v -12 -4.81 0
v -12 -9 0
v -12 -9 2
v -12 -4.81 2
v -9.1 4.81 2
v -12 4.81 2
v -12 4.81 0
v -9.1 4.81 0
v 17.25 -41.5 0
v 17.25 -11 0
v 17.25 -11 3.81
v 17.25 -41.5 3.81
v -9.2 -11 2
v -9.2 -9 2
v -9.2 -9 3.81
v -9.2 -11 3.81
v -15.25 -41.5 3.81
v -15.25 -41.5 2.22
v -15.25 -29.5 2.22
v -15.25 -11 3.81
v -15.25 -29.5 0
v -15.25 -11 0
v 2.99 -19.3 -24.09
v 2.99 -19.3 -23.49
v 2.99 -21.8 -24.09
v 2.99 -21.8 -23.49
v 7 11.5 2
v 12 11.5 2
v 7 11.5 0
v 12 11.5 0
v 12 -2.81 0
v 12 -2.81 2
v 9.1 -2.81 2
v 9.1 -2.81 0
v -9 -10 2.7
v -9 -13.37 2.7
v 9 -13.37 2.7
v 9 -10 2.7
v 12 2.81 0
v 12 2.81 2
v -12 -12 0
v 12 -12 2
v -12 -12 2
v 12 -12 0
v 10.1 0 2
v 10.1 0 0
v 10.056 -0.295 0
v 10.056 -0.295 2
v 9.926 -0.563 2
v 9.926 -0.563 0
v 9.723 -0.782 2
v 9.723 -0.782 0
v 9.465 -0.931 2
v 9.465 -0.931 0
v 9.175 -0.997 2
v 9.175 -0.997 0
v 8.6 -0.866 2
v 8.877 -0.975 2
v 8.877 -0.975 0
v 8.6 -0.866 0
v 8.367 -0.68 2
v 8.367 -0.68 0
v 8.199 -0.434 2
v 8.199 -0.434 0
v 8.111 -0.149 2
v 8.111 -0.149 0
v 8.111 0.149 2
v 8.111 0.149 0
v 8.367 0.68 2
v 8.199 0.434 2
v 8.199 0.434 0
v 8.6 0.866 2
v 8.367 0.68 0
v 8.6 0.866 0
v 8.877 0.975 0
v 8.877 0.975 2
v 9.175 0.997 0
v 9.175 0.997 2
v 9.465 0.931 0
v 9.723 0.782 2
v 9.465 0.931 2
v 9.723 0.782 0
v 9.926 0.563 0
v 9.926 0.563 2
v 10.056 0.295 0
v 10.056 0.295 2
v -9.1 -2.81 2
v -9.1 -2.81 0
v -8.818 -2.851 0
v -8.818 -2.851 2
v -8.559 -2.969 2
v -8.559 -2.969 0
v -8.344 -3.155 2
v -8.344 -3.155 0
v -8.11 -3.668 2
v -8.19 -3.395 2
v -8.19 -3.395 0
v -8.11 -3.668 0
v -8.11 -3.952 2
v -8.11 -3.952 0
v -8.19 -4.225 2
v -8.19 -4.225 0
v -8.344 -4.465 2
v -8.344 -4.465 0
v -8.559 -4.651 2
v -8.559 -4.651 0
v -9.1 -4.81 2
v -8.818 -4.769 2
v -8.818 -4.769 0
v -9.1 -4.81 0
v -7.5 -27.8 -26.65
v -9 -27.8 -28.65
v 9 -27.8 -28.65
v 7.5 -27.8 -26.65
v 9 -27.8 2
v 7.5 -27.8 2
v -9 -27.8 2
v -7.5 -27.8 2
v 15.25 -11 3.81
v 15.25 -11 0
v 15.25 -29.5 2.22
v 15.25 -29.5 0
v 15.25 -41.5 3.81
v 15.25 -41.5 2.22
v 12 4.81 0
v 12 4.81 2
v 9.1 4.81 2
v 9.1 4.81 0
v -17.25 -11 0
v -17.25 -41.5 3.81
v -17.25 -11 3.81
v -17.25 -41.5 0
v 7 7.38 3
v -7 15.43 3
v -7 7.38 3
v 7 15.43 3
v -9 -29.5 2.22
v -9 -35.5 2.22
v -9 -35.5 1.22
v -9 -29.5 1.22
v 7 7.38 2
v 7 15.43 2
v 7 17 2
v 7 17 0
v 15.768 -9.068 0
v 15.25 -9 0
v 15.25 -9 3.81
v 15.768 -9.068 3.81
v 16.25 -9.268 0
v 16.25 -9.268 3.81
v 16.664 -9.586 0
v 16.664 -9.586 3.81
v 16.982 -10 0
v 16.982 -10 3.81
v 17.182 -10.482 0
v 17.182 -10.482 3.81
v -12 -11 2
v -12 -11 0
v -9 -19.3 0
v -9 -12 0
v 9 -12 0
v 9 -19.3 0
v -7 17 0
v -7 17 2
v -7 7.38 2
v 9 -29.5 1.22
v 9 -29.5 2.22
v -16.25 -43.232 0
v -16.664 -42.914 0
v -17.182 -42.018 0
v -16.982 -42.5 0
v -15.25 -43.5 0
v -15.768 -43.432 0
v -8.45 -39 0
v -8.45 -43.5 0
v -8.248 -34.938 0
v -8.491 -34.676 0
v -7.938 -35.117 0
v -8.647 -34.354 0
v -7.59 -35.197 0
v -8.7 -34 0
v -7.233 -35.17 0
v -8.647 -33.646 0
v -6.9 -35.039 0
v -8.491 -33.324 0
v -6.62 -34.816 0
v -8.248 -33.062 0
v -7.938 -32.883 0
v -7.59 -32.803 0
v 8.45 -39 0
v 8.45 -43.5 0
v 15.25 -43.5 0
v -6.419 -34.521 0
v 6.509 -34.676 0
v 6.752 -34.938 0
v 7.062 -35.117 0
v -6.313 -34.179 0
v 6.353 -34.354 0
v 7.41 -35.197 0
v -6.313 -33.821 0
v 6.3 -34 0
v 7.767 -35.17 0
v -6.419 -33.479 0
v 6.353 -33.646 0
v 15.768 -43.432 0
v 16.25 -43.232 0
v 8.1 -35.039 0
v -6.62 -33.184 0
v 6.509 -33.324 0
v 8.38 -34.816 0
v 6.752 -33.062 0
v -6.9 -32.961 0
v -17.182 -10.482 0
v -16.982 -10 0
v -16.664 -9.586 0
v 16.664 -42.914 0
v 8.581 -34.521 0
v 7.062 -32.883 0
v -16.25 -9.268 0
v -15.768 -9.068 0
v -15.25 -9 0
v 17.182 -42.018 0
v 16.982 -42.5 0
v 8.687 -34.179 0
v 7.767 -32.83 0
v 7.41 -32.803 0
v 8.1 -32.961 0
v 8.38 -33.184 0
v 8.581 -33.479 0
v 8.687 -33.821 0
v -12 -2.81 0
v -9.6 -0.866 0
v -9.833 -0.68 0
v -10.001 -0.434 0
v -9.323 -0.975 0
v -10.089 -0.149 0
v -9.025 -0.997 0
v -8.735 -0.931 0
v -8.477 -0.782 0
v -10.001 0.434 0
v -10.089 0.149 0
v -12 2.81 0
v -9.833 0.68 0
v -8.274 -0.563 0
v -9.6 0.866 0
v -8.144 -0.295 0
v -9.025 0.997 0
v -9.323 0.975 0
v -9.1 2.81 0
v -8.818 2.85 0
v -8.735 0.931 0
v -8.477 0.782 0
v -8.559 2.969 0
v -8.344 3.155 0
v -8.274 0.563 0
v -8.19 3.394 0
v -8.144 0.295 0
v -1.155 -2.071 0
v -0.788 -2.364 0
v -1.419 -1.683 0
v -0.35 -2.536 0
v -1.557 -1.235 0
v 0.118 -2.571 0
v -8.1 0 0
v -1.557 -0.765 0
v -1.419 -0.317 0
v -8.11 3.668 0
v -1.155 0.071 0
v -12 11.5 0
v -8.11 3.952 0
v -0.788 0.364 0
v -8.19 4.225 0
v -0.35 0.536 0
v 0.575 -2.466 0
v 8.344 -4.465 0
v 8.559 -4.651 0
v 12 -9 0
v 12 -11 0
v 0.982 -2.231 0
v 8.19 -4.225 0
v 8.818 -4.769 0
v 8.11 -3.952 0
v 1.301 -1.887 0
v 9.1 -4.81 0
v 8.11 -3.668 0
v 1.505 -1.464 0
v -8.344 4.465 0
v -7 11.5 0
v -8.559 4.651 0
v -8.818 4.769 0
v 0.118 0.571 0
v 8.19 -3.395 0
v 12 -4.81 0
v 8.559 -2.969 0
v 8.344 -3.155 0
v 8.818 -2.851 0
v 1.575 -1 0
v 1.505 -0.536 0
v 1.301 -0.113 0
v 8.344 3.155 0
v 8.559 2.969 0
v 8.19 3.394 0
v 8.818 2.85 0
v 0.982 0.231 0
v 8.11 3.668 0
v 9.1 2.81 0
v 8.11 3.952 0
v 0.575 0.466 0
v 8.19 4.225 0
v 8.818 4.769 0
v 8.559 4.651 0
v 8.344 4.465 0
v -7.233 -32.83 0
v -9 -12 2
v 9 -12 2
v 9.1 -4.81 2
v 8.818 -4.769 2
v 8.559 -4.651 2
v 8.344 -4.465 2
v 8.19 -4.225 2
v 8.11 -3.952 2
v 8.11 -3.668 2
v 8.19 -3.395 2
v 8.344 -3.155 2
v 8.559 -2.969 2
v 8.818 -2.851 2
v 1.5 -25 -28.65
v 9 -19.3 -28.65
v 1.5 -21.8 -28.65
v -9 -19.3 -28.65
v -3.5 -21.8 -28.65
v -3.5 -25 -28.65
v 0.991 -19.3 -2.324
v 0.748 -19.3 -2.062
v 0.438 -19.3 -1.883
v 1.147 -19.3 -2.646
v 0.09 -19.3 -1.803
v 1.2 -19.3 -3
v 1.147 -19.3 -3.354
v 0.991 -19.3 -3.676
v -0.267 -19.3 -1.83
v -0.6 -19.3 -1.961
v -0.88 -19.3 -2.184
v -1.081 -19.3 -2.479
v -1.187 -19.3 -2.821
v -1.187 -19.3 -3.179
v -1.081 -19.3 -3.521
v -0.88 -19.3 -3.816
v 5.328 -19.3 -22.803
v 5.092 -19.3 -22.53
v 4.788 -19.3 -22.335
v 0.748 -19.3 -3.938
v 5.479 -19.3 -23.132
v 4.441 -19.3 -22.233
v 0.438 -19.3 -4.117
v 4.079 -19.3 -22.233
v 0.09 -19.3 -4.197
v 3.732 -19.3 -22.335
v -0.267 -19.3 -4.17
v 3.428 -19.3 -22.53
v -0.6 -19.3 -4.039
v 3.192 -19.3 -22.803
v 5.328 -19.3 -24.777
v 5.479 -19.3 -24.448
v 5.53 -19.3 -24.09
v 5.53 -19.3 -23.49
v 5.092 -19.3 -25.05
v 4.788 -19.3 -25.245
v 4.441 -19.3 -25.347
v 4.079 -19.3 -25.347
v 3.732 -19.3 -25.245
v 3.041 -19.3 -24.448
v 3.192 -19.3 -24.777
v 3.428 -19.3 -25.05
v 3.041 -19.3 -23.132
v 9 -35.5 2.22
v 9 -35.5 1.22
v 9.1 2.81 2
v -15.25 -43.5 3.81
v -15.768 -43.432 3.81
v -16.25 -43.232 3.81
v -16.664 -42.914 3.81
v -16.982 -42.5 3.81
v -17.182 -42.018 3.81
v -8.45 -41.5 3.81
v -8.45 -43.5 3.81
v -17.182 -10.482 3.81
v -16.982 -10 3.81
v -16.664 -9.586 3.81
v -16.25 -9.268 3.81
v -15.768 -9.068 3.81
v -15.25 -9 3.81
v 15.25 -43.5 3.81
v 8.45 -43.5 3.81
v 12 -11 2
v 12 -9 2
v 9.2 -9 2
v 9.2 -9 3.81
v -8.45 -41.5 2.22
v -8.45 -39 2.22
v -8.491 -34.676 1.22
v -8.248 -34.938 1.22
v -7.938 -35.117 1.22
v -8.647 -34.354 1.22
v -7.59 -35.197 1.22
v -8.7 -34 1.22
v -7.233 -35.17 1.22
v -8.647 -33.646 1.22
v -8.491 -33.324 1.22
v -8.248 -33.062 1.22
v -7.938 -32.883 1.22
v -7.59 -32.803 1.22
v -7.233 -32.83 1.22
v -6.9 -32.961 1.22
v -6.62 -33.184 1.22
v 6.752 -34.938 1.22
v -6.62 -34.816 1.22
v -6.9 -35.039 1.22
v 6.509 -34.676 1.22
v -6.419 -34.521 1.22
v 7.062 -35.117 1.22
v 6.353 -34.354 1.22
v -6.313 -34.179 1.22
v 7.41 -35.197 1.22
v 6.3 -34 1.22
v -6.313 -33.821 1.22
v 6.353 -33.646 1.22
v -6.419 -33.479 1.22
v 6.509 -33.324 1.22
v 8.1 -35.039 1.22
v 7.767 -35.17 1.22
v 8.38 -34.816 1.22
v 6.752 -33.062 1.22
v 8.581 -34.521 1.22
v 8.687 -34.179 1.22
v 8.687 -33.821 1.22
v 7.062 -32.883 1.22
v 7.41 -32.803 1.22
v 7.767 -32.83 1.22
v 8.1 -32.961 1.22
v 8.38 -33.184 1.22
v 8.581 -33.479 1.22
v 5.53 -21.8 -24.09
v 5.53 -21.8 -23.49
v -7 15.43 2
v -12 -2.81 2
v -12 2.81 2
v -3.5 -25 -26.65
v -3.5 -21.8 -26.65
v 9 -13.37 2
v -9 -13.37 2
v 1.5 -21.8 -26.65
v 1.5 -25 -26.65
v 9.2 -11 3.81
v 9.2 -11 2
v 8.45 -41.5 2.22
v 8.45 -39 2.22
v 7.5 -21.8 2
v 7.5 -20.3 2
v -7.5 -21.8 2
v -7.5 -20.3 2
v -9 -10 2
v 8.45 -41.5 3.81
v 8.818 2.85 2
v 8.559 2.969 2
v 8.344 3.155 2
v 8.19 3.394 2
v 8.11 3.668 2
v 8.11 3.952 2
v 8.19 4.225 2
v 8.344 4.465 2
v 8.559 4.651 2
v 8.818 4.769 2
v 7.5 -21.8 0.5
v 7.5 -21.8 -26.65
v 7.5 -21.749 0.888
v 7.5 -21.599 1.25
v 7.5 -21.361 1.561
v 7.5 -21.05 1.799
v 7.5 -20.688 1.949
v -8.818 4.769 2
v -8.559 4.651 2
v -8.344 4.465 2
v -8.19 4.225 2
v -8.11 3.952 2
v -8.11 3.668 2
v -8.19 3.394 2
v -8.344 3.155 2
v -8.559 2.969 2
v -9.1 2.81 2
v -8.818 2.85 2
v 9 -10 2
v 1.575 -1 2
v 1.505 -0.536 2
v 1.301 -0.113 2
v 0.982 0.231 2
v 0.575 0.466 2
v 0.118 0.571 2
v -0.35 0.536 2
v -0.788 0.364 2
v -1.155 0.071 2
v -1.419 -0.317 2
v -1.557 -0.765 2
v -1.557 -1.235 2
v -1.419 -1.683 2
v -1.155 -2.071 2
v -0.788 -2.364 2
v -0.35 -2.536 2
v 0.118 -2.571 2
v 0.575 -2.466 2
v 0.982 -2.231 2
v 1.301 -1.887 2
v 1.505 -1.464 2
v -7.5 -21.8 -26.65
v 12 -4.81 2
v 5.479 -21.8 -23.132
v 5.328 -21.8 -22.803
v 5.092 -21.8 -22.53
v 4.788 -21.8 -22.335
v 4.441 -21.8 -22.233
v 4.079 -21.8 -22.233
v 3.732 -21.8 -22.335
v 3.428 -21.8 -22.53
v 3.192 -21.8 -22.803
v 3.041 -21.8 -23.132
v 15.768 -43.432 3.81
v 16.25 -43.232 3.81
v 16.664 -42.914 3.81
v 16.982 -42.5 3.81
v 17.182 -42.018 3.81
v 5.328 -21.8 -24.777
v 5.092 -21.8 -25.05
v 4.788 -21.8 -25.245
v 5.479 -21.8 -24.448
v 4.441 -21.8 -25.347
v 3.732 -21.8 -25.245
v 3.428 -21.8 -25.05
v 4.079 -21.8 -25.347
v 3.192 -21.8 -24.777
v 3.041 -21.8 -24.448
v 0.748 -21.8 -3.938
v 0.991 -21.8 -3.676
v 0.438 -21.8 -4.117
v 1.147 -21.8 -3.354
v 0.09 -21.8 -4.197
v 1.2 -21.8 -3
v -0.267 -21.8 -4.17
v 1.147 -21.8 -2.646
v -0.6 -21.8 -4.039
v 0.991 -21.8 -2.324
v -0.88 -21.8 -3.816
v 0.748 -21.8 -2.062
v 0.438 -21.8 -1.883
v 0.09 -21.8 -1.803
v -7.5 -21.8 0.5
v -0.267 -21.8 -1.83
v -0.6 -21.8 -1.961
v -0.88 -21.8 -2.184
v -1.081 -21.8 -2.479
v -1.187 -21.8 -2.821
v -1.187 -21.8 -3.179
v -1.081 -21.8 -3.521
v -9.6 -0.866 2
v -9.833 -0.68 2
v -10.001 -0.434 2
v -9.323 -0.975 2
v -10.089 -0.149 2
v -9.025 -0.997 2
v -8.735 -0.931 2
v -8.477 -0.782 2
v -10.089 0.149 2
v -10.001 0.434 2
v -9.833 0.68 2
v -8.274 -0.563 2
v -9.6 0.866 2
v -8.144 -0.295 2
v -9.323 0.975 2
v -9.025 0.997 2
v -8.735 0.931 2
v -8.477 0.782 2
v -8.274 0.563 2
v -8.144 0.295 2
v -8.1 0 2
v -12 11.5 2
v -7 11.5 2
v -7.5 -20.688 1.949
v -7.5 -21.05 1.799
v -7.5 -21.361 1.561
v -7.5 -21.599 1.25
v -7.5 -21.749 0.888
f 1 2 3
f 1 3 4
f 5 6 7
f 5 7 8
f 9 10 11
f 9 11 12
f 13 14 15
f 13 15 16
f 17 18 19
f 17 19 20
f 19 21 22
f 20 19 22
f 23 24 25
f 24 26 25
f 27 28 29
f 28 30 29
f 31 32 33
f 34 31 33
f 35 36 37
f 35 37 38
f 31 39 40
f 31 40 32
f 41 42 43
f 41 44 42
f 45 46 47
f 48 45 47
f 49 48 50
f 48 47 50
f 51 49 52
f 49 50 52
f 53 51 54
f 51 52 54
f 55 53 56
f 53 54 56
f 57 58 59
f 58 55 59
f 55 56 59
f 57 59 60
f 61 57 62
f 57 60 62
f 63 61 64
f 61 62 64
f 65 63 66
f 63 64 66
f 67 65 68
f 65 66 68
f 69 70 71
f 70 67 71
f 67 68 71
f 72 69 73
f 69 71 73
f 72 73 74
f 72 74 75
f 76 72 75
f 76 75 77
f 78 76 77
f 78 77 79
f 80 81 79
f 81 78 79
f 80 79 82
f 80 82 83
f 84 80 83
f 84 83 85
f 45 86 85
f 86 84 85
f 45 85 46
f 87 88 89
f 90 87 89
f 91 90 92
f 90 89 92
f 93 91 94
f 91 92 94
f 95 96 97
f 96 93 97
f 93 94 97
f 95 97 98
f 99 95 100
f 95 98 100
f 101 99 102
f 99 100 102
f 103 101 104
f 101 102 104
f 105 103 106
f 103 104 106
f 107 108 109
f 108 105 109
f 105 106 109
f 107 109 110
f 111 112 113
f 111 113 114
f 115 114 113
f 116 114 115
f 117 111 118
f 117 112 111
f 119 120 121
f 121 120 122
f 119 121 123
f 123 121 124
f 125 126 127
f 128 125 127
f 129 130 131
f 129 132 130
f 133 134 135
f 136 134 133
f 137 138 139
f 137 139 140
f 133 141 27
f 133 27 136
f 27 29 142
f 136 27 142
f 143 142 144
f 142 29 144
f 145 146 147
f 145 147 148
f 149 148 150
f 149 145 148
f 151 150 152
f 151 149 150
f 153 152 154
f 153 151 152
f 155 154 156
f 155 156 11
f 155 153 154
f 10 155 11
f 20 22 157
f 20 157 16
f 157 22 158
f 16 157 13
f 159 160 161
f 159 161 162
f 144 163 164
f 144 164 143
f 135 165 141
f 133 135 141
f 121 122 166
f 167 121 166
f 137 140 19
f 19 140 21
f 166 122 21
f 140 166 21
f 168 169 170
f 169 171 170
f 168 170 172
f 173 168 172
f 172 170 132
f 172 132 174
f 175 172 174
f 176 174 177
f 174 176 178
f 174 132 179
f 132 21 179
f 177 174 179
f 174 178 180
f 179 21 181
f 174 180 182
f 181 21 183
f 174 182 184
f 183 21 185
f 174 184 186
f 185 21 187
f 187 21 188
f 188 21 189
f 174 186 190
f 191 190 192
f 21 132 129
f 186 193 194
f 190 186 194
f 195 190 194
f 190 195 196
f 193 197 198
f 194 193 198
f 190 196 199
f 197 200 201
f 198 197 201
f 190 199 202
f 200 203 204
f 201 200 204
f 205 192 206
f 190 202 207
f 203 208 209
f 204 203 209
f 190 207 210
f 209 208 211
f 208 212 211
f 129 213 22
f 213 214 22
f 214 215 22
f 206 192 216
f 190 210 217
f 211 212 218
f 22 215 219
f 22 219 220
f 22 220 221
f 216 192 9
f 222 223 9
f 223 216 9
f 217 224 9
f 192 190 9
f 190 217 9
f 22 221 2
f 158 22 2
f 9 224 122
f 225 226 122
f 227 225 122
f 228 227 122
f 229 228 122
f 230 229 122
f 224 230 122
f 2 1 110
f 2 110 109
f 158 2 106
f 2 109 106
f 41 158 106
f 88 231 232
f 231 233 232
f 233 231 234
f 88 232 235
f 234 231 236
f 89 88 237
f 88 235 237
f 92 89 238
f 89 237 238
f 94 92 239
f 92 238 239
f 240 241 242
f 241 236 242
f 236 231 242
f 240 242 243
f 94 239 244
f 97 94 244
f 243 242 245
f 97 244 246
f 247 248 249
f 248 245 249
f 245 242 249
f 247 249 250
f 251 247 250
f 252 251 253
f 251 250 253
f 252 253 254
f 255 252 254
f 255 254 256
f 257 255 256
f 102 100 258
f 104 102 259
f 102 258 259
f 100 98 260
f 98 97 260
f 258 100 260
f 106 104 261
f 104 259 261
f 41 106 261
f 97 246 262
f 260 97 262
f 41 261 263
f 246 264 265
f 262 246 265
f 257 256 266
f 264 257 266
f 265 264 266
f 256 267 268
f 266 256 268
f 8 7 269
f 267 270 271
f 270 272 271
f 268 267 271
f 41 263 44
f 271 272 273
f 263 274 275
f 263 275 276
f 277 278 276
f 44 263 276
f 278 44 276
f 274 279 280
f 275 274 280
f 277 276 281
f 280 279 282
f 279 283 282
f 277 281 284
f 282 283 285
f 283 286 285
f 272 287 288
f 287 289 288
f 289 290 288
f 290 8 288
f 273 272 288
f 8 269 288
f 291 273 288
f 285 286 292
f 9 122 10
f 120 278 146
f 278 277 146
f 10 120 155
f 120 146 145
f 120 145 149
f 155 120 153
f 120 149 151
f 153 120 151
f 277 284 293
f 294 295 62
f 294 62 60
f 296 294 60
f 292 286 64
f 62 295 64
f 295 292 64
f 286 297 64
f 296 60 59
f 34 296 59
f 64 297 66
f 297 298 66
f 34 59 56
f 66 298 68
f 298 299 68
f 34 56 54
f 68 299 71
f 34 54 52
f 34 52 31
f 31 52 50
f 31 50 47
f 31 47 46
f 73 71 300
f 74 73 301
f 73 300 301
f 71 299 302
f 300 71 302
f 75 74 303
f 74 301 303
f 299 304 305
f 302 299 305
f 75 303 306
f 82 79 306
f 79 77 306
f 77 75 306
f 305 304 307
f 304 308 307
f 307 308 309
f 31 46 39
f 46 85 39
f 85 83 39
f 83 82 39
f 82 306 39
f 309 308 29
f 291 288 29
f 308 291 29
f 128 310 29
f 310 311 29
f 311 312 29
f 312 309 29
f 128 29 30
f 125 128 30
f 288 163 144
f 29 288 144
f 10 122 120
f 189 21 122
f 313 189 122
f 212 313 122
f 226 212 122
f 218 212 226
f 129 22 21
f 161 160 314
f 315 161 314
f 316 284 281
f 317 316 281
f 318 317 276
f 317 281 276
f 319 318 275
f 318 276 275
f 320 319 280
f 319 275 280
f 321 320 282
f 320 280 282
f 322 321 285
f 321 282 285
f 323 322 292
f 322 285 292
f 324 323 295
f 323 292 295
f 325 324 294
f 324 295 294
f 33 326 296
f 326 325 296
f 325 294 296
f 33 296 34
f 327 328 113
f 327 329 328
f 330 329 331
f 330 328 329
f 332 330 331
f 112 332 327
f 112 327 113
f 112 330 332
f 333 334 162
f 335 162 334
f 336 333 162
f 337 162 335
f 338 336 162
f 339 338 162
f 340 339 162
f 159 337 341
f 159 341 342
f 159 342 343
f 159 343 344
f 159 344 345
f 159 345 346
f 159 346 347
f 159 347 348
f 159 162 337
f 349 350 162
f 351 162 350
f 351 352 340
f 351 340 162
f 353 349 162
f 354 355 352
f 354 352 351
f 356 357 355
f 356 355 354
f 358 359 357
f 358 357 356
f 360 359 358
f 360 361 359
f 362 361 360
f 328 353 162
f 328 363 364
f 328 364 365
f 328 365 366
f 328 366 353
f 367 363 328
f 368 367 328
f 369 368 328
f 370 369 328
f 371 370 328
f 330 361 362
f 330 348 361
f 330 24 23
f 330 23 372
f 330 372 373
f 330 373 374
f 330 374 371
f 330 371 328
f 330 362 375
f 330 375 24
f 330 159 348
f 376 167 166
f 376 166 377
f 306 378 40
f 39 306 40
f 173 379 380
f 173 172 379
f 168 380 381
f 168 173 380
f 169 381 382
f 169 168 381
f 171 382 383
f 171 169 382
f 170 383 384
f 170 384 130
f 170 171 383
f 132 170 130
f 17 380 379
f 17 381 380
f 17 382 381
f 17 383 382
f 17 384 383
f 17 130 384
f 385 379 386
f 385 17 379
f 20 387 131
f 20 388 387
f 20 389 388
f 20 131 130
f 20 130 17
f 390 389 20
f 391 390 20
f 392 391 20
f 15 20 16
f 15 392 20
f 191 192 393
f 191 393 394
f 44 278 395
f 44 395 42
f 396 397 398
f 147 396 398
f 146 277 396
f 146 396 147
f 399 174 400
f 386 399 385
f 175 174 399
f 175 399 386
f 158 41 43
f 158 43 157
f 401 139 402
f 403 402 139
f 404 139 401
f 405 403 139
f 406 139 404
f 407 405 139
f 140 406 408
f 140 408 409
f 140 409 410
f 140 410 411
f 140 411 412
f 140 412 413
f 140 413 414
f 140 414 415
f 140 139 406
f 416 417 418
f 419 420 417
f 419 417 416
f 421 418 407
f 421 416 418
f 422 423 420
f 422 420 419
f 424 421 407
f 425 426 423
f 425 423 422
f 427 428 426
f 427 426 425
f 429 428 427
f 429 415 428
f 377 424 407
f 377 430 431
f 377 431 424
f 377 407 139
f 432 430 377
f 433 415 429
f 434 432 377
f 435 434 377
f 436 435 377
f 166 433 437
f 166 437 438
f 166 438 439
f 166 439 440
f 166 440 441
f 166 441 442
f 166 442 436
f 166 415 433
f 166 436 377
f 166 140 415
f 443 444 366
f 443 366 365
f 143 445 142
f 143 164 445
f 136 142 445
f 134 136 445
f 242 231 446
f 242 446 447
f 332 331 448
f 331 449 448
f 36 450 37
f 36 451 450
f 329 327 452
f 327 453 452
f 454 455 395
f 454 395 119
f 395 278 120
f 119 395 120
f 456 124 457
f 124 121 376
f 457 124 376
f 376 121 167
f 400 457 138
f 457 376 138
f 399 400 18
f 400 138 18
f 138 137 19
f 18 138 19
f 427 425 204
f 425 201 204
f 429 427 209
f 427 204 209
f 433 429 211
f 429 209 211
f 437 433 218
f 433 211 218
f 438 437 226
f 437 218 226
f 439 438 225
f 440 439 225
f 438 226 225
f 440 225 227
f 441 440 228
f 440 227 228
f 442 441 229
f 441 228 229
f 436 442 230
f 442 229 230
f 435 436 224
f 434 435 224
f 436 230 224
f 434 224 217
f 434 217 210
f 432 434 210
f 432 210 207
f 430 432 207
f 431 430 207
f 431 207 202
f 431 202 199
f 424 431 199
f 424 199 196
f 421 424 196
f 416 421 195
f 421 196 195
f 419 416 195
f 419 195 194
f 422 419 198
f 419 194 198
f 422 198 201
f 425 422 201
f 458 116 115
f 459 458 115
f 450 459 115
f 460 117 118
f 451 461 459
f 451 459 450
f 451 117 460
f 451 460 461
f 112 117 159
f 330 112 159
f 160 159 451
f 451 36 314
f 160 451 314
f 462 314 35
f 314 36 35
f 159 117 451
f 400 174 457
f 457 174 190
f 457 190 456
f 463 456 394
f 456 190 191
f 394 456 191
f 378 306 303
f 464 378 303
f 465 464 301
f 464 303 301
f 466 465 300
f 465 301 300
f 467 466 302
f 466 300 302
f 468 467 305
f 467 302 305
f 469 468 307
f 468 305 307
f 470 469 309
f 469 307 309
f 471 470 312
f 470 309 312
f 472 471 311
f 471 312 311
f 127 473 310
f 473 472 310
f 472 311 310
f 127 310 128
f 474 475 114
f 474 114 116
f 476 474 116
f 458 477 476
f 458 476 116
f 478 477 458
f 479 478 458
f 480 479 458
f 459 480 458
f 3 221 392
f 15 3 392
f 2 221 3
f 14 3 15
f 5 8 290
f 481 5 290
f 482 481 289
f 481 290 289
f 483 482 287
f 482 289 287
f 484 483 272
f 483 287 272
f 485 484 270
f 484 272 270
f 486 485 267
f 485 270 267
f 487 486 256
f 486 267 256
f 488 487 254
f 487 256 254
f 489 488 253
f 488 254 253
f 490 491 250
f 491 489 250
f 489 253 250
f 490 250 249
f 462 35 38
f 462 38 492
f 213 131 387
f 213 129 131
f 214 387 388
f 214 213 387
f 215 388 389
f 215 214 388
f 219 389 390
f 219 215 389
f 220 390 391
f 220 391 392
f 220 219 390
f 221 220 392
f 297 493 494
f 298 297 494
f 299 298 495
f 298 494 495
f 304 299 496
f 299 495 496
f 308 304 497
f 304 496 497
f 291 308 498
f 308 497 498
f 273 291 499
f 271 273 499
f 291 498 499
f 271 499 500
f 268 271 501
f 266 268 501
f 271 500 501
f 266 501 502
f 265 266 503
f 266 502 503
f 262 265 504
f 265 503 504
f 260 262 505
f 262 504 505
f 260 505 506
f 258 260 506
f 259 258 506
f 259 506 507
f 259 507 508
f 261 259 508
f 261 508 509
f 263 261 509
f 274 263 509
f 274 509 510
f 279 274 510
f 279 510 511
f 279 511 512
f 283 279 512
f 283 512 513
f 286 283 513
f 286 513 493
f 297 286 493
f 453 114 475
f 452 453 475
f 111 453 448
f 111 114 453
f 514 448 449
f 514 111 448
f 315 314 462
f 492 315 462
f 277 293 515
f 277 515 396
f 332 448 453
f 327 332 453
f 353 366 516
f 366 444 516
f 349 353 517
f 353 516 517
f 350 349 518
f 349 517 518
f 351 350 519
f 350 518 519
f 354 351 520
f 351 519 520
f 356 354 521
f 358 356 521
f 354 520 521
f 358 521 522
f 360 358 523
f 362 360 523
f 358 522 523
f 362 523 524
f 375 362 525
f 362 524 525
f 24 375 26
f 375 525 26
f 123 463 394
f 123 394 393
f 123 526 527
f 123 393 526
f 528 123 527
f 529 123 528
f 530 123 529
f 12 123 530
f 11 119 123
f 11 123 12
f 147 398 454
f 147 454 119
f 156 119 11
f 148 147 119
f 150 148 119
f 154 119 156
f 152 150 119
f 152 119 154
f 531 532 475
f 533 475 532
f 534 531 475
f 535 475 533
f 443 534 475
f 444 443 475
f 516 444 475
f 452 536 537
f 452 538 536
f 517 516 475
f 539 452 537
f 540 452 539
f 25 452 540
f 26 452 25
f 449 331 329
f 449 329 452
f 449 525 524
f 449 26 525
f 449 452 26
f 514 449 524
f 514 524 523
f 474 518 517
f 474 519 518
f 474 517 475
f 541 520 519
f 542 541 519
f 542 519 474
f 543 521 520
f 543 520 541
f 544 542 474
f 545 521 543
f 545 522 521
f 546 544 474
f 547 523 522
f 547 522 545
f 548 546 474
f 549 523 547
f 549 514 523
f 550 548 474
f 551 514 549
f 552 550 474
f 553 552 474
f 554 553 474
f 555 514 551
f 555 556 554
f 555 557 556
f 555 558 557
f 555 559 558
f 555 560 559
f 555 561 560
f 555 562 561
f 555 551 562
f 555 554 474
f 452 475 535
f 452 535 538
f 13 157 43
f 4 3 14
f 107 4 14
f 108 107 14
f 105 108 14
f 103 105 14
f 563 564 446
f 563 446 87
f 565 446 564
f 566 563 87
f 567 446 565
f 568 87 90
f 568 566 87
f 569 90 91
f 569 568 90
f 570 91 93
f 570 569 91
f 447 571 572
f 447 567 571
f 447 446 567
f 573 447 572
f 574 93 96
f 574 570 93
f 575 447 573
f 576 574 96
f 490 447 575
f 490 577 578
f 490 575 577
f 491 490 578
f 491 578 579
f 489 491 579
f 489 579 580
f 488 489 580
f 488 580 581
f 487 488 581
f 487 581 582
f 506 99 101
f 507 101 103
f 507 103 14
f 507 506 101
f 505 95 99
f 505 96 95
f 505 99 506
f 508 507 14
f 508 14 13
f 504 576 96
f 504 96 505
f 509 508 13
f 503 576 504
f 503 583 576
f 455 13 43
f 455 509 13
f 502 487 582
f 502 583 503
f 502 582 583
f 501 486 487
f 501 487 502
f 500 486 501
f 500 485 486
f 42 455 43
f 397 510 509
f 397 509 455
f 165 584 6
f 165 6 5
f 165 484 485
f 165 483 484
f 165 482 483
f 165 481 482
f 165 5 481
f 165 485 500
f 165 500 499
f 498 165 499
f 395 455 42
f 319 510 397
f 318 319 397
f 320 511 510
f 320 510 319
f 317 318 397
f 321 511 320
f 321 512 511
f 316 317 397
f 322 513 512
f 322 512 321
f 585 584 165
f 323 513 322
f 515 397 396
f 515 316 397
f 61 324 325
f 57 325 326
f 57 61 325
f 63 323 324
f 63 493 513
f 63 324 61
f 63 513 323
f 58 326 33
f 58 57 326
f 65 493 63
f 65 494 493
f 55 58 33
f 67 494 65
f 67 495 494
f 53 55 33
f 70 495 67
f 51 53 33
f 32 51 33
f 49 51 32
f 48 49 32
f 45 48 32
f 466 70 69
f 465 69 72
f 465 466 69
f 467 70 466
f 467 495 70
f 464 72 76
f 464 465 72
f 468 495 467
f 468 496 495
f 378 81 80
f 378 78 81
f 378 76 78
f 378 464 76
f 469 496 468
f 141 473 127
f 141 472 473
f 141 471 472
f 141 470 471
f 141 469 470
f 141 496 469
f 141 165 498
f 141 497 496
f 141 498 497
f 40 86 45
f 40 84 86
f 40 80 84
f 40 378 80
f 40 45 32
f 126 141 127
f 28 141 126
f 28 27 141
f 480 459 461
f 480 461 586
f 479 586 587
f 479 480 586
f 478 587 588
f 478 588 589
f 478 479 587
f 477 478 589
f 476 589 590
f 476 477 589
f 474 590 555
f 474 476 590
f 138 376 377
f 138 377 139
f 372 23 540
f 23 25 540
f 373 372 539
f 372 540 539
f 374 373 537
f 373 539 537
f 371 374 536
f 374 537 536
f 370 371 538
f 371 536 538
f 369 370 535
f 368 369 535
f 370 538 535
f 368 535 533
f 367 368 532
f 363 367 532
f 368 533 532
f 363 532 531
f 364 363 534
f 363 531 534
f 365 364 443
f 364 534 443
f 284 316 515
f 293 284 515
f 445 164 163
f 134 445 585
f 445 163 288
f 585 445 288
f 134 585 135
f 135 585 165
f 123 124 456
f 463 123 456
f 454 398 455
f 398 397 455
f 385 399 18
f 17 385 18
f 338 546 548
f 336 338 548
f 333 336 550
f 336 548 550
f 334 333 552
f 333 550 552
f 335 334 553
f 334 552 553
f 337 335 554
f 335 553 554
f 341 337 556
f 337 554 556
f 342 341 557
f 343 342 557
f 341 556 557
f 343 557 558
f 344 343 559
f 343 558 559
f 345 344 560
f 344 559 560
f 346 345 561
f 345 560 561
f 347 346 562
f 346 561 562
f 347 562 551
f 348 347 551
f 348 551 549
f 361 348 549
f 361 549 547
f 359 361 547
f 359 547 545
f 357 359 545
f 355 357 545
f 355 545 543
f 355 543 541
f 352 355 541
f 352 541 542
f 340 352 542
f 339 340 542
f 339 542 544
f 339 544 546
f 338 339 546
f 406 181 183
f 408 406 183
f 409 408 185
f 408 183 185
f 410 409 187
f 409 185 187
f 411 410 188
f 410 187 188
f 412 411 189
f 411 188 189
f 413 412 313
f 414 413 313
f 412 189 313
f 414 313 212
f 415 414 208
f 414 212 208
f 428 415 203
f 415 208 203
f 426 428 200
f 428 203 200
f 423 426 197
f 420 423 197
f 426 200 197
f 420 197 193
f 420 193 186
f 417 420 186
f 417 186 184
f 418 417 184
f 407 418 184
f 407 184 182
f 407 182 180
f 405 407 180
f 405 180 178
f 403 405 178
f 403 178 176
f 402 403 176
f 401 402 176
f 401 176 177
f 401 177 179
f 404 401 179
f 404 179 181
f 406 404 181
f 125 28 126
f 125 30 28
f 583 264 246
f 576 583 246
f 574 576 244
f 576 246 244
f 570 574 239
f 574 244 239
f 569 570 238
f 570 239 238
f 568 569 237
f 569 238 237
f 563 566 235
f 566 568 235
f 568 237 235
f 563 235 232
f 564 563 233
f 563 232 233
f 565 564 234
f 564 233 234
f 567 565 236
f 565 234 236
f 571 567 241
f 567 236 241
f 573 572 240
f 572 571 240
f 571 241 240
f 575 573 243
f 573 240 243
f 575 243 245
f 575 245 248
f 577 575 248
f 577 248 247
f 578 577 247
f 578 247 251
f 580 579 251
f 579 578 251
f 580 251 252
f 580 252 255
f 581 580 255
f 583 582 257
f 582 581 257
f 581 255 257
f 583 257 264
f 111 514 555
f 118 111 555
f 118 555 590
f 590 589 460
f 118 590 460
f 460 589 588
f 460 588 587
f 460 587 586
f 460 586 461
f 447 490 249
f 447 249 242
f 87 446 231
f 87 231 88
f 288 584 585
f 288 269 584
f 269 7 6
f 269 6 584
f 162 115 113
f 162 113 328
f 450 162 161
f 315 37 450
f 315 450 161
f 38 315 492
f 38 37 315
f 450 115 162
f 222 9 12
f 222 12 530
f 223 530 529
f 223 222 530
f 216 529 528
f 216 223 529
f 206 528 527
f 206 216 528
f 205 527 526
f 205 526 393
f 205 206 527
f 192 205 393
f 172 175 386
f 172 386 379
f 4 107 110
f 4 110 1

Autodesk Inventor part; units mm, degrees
ref_plane "YZ Plane" through (0, 0, 0) normal (1, 0, 0) x (0, 1, 0)
ref_plane "XZ Plane" through (0, 0, 0) normal (0, 1, 0) x (-1, 0, 0)
ref_plane "XY Plane" through (0, 0, 0) normal (0, 0, 1) x (1, 0, 0)
sketch "Sketch1" plane through (0, 0, 0) normal (0, 0, 1) x (1, 0, 0)
  circle A0 centre (0, 0) radius 2.3
  line L0 (-9.1, -9.1) -> (9.1, 9.1) construction
  line L1 (9.1, -9.1) -> (-9.1, 9.1) construction
  circle A1 centre (9.1, 0) radius 1
  circle A2 centre (-9.1, 0) radius 1
  circle A3 centre (9.1, 3.8099) radius 1
  circle A4 centre (9.1, -3.81) radius 1
  circle A5 centre (-9.1, 3.8099) radius 1
  circle A6 centre (-9.1, -3.81) radius 1
  line L2 (-7, 17) -> (7, 17)
  line L3 (12, 11.5) -> (12, -12)
  line L4 (12, -12) -> (-12, -12)
  line L5 (-12, -12) -> (-12, 11.5)
  line L6 (-4.81, 9.1) -> (-9.1, 9.1)
  line L7 (9.1, 9.1) -> (4.81, 9.1)
  line L8 (9.1, 4.8099) -> (9.1, 9.1)
  line L9 (9.1, 1) -> (9.1, 2.8099)
  line L10 (9.1, -9.1) -> (9.1, -4.81)
  line L11 (9.1, -2.81) -> (9.1, -1)
  line L12 (4.81, -9.1) -> (9.1, -9.1)
  line L13 (-9.1, -9.1) -> (-4.81, -9.1)
  line L14 (-9.1, -4.81) -> (-9.1, -9.1)
  line L15 (-9.1, -1) -> (-9.1, -2.81)
  line L16 (-9.1, 9.1) -> (-9.1, 4.8099)
  line L17 (-9.1, 2.8099) -> (-9.1, 1)
  line L18 (4.81, 9.1) -> (-4.81, 9.1)
  line L19 (-4.81, -9.1) -> (4.81, -9.1)
  line L20 (-12, 11.5) -> (-7, 11.5)
  line L21 (-7, 11.5) -> (-7, 17)
  line L22 (12, 11.5) -> (7, 11.5)
  line L23 (7, 11.5) -> (7, 17)
  dimension "d0" = 18.2
  dimension "d1" = 18.2
  dimension "d6" = 2
  dimension "d7" = 2
  dimension "d10" = 4.6
  dimension "d11" = 2
  dimension "d12" = 2
  dimension "d15" = 2
  dimension "d16" = 2
  dimension "d17" = 3.8099
  dimension "d18" = 3.81
  dimension "d19" = 24
  dimension "d127" = 2.9
  dimension "d128" = 2.9
  dimension "d129" = 29
  dimension "d140" = 5
  dimension "d141" = 5
  dimension "d142" = 5.5
extrude "Extrusion1" add sketch "Sketch1" along normal blind 2 contours A0 | A1 L11 A4 L10 L12 L19 L13 L14 A6 L15 A2 L17 A5 L16 L6 L18 L7 L8 A3 L9 | L2 L23 L22 L3 L4 L5 L20 L21
sketch "Sketch6" plane through (0, 0, 2) normal (0, 0, 1) x (1, 0, 0)
  circle A0 centre (-9.1, -3.81) radius 1 projected
  line L0 (-9.1, -4.81) -> (-13.3624, -4.81)
  line L1 (-13.3624, -4.81) -> (-13.3624, -2.81)
  line L2 (-13.3624, -2.81) -> (-9.1, -2.81)
  line L3 (-9.1, -2.81) -> (-9.1, -4.81)
  circle A1 centre (-9.1, 3.8099) radius 1 projected
  line L4 (-9.1, 2.8099) -> (-13.4787, 2.8099)
  line L5 (-13.4787, 2.8099) -> (-13.4787, 4.8099)
  line L6 (-13.4787, 4.8099) -> (-9.1, 4.8099)
  line L7 (-9.1, 4.8099) -> (-9.1, 2.8099)
  circle A2 centre (9.1, -3.81) radius 1 projected
  line L8 (9.1, -4.81) -> (13.9248, -4.81)
  line L9 (13.9248, -4.81) -> (13.9248, -2.81)
  line L10 (13.9248, -2.81) -> (9.1, -2.81)
  line L11 (9.1, -2.81) -> (9.1, -4.81)
  line L12 (9.1, 2.8099) -> (14.1963, 2.8099)
  line L13 (14.1963, 2.8099) -> (14.1963, 4.8099)
  line L14 (14.1963, 4.8099) -> (9.1, 4.8099)
  line L15 (9.1, 4.8099) -> (9.1, 2.8099)
  point P0 (0, 0)
extrude "Extrusion5" cut sketch "Sketch6" against normal blind 40 contours L3 A0 | A0 L0 L1 L2 | L7 A1 | A1 L4 L5 L6 | A2 L11 | A2 L10 L9 L8 | L15 L14 L13 L12 picked at (-9.4117, -3.6918) picked at (-9.4117, 3.9281) picked at (9.1742, -3.485)
sketch "Sketch8" plane through (0, 0, 0) normal (1, 0, 0) x (0, 1, 0)
  line L0 (-12, 0) -> (-19.3, 0)
  line L1 (-19.3, 0) -> (-19.3, -28.65)
  line L2 (-19.3, -28.65) -> (-27.8, -28.65)
  line L3 (-27.8, -28.65) -> (-27.8, -26.65)
  line L4 (-27.8, -26.65) -> (-21.8, -26.65)
  line L5 (-21.8, -26.65) -> (-21.8, 2)
  line L6 (-21.8, 2) -> (-12, 2)
  line L7 (-12, 0) -> (-12, 2) projected
  line L8 (-12, 0) -> (-12, 2)
  line L9 (-13.3698, 2) -> (-13.3698, 2.7)
  line L10 (-13.3698, 2.7) -> (-10, 2.7)
  line L11 (-10, 2.7) -> (-10, 2)
  line L12 (-12, 2) -> (-10, 2)
  point P0 (0, 0)
  dimension "d49" = 2.5
  dimension "d50" = 7.3
  dimension "d51" = 28.65
  dimension "d52" = 2
  dimension "d53" = 2
  dimension "d54" = 0.7
  dimension "d57" = 6
extrude "Extrusion7" add sketch "Sketch8" along normal mid plane 18 separate body
sketch "Sketch9" plane through (-9, -21.8, -26.65) normal (0, -1, 0) x (1, 0, 0)
  line L0 (0, 0) -> (1.5, 0)
  line L1 (1.5, 0) -> (1.5, 28.65)
  line L2 (1.5, 28.65) -> (0, 28.65)
  line L3 (0, 28.65) -> (0, 0)
  line L4 (0, 0) -> (18, 0) projected
  line L5 (18, 0) -> (16.5, 0)
  line L6 (16.5, 0) -> (16.5, 28.65)
  line L7 (16.5, 28.65) -> (18, 28.65)
  line L8 (18, 28.65) -> (18, 0)
  line L9 (8, 28.65) -> (10, 28.65) projected
  line L10 (9, 28.65) -> (9, -2)
  line L11 (0, -2) -> (18, -2) projected
  line L12 (0, 28.65) -> (18, 28.65) projected
  point P0 (9, 26.65)
  dimension "d58" = 15
extrude "Extrusion8" add sketch "Sketch9" along normal blind 6 contours L3 L2 L1 L0 | L6 L7 L8 L4 bodies 2
sketch "Sketch10" plane through (-7.5, -29.8, -26.65) normal (0, 0, 1) x (1, 0, 0)
  line L0 (4, 4.8) -> (9, 4.8)
  line L1 (9, 4.8) -> (9, 8)
  line L2 (9, 8) -> (4, 8)
  line L3 (4, 8) -> (4, 4.8)
  line L4 (0, 8) -> (0, 2) projected
  line L5 (0, 8) -> (15, 8) projected
  point P0 (7.5, 29.8)
  point P1 (-2.5, 8)
  point P2 (17.5, 8)
  dimension "d63" = 4
  dimension "d64" = 5
  dimension "d65" = 3.2
extrude "Extrusion9" cut sketch "Sketch10" against normal blind 8 bodies 2
sketch "Sketch11" plane through (-7.5, -21.8, 2) normal (0, -1, 0) x (1, 0, 0)
  line L0 (0, -28.65) -> (0, 0) projected
  line L1 (0, -28.65) -> (15, -28.65) projected
  circle A0 centre (7.5, -5) radius 1.2
  line L2 (16.5, -2) -> (-1.5, -2) projected
  arc A1 (13.03, -25.49) -> (10.49, -25.49) centre (11.76, -25.49) ccw
  arc A2 (10.49, -26.09) -> (13.03, -26.09) centre (11.76, -26.09) ccw
  line L3 (10.49, -25.49) -> (10.49, -26.09)
  line L4 (13.03, -25.49) -> (13.03, -26.09)
  point P0 (7.5, -2)
  dimension "d74" = 2.4
  dimension "d75" = 3
  dimension "d119" = 2.54
  dimension "d120" = 2.54
  dimension "d123" = 11.76
  dimension "d124" = 3.16
  dimension "d125" = 0.6
extrude "Extrusion10" cut sketch "Sketch11" against normal blind 8 bodies 2
fillet "Fillet1" radius 1.5 1 edges at (0, -21.8, 2)
sketch "Sketch12" plane through (0, 0, 2) normal (0, 0, 1) x (1, 0, 0)
  line L0 (15.25, -11) -> (15.25, -41.5)
  line L1 (-15.25, -41.5) -> (-15.25, -11)
  line L2 (-15.25, -11) -> (15.25, -41.5) construction
  line L3 (15.25, -11) -> (-15.25, -41.5) construction
  line L4 (-12, -12) -> (12, -12) projected
  line L5 (17.25, -9) -> (17.25, -43.5)
  line L6 (-17.25, -43.5) -> (-17.25, -9)
  line L7 (-8.45, -41.5) -> (-8.45, -43.5)
  line L8 (8.45, -41.5) -> (8.45, -43.5)
  line L9 (17.25, -43.5) -> (8.45, -43.5)
  line L10 (-8.45, -43.5) -> (-17.25, -43.5)
  line L11 (15.25, -41.5) -> (8.45, -41.5)
  line L12 (-8.45, -41.5) -> (-15.25, -41.5)
  line L13 (-9.2, -9) -> (-9.2, -11)
  line L14 (9.2, -9) -> (9.2, -11)
  line L15 (-9, -13.3698) -> (-9, -10) projected
  line L16 (9, -10) -> (9, -13.3698) projected
  line L17 (-17.25, -9) -> (-9.2, -9)
  line L18 (9.2, -9) -> (17.25, -9)
  line L19 (-15.25, -11) -> (-9.2, -11)
  line L20 (9.2, -11) -> (15.25, -11)
  point P0 (0, 0)
  point P1 (0, -26.25)
  dimension "d76" = 30.5
  dimension "d79" = 2
  dimension "d80" = 6.8
  dimension "d81" = 6.8
  dimension "d88" = 0.2
  dimension "d89" = 0.2
extrude "Extrusion11" add sketch "Sketch12" along normal blind 1.81 and the other way blind 2 bodies 1
sketch "Sketch13" plane through (0, 0, 0) normal (0, 0, -1) x (-1, 0, 0)
  line L0 (-15.25, -41.5) -> (-8.45, -41.5) projected
  line L1 (-15.25, -41.5) -> (-8.45, -41.5)
  line L2 (-8.45, -41.5) -> (-8.45, -39)
  line L3 (-8.45, -39) -> (-15.25, -39)
  line L4 (-15.25, -39) -> (-15.25, -41.5)
  line L5 (8.45, -41.5) -> (15.25, -41.5) projected
  line L6 (15.25, -41.5) -> (8.45, -41.5)
  line L7 (8.45, -41.5) -> (8.45, -39)
  line L8 (8.45, -39) -> (15.25, -39)
  line L9 (15.25, -39) -> (15.25, -41.5)
  line L10 (-15.25, -11) -> (-15.25, -41.5) projected
  line L11 (-15.25, -29.5) -> (15.25, -29.5)
  line L12 (15.25, -29.5) -> (15.25, -39)
  line L13 (15.25, -39) -> (-15.25, -39)
  line L14 (-15.25, -39) -> (-15.25, -29.5)
  point P0 (0, 0)
  dimension "d84" = 2.5
  dimension "d85" = 6.8
  dimension "d92" = 2.5
  dimension "d93" = 12
extrude "Extrusion12" add sketch "Sketch13" against normal blind 2.22 bodies 1
sketch "Sketch15" plane through (0, 0, 2.22) normal (0, 0, 1) x (1, 0, 0)
  line L0 (-9, -23.5) -> (9, -23.5)
  line L1 (9, -23.5) -> (9, -35.5)
  line L2 (9, -35.5) -> (-9, -35.5)
  line L3 (-9, -35.5) -> (-9, -23.5)
  line L4 (15.25, -29.5) -> (-15.25, -29.5) projected
  line L5 (-9, -23.5) -> (9, -35.5) construction
  line L6 (9, -23.5) -> (-9, -35.5) construction
  line L7 (15.25, -41.5) -> (8.45, -41.5) projected
  point P0 (0, 0)
  point P1 (0, -29.5)
  dimension "d94" = 18
  dimension "d95" = 6
extrude "Extrusion13" cut sketch "Sketch15" against normal blind 1 bodies 1
sketch "Sketch17" plane through (0, 0, 0) normal (0, 0, -1) x (-1, 0, 0)
  circle A0 centre (-7.5, -34) radius 1.2
  circle A1 centre (7.5, -34) radius 1.2
  line L0 (-8.45, -39) -> (8.45, -39) projected
  line L1 (15.25, -29.5) -> (-15.25, -29.5) projected
  line L2 (8.45, -39) -> (-8.45, -39) construction
  line L3 (0, -39) -> (0, -29.5) construction
  point P0 (0, 0)
  dimension "d115" = 2.4
  dimension "d151" = 7.5
  dimension "d152" = 7.5
  dimension "d153" = 5
  dimension "d154" = 5
extrude "Extrusion15" cut sketch "Sketch17" against normal blind 12 bodies 1
fillet "Fillet2" radius 2 4 edges at (-17.25, -43.5, 1.905) (17.25, -43.5, 1.905) (17.25, -9, 1.905) (-17.25, -9, 1.905)
sketch "Sketch18" plane through (0, 0, 2) normal (0, 0, 1) x (1, 0, 0)
  circle A0 centre (0, -1) radius 1.575
  line L0 (-9, -10) -> (9, -10) construction
  point P0 (0, 0)
  dimension "d131" = 3.15
  dimension "d175" = 9
extrude "Extrusion16" cut sketch "Sketch18" against normal blind 10 bodies 1
sketch "Sketch26" plane through (0, 0, 2) normal (0, 0, 1) x (1, 0, 0)
  line L0 (-7, 7.38) -> (7, 7.38)
  line L1 (7, 7.38) -> (7, 15.43)
  line L2 (7, 15.43) -> (-7, 15.43)
  line L3 (-7, 15.43) -> (-7, 7.38)
  circle A0 centre (0, -1) radius 1.575 construction
  point P0 (0, 0)
  dimension "d176" = 8.38
  dimension "d177" = 8.05
extrude "Extrusion24" add sketch "Sketch26" along normal blind 1 bodies 1
sketch "Sketch21" plane through (0, 0, 3.81) normal (0, 0, 1) x (1, 0, 0)
  arc A0 (-15.25, -9) -> (-17.25, -11) centre (-15.25, -11) ccw projected
  line L0 (-17.25, -11) -> (-17.25, -41.5) projected
  arc A1 (-17.25, -41.5) -> (-15.25, -43.5) centre (-15.25, -41.5) ccw projected
  line L1 (-15.25, -43.5) -> (-8.45, -43.5) projected
  line L2 (-8.45, -43.5) -> (-8.45, -41.5) projected
  line L3 (-8.45, -41.5) -> (-15.25, -41.5) projected
  line L4 (-15.25, -41.5) -> (-15.25, -11) projected
  line L5 (-15.25, -11) -> (-9.2, -11) projected
  line L6 (-9.2, -11) -> (-9.2, -9) projected
  line L7 (-9.2, -9) -> (-15.25, -9) projected
  arc A2 (17.25, -11) -> (15.25, -9) centre (15.25, -11) ccw projected
  line L8 (15.25, -9) -> (9.2, -9) projected
  line L9 (9.2, -9) -> (9.2, -11) projected
  line L10 (9.2, -11) -> (15.25, -11) projected
  line L11 (15.25, -11) -> (15.25, -41.5) projected
  line L12 (15.25, -41.5) -> (8.45, -41.5) projected
  line L13 (8.45, -41.5) -> (8.45, -43.5) projected
  line L14 (8.45, -43.5) -> (15.25, -43.5) projected
  arc A3 (15.25, -43.5) -> (17.25, -41.5) centre (15.25, -41.5) ccw projected
  line L15 (17.25, -41.5) -> (17.25, -11) projected
  line L16 (-8.45, -43.5) -> (-8.45, -39) projected
  line L17 (-8.45, -43.5) -> (8.45, -43.5)
  line L18 (7.15, -9) -> (-7.15, -9)
  line L19 (-15.25, -41.5) -> (-15.25, -11) projected
  line L20 (-15.25, -41.5) -> (-15.25, -11)
  line L21 (9.2, -11) -> (15.25, -11) projected
  line L22 (-15.25, -11) -> (15.25, -11)
  line L23 (15.25, -11) -> (15.25, -41.5) projected
  line L24 (15.25, -11) -> (15.25, -41.5)
  line L25 (-15.25, -41.5) -> (15.25, -41.5)
  line L26 (15.25, -9) -> (9.2, -9) projected
  line L27 (12, -9) -> (12, 1)
  line L28 (7.15, 1) -> (7.15, -9)
  line L29 (-7.15, 1) -> (-7.15, -9)
  line L30 (7, 5.1664) -> (7, 17) projected
  line L31 (-7, 17) -> (-7, 5.1664) projected
  line L32 (-12, -4.81) -> (-12, -9) projected
  line L33 (-12, -9) -> (-12, 1)
  line L34 (-12, 1) -> (-7.15, 1)
  line L35 (7.15, 1) -> (12, 1)
  point P0 (0, 0)
  dimension "d161" = 0.15
  dimension "d162" = 0.15
  dimension "d163" = 10
sketch "Sketch22" plane through (0, 0, 3.81) normal (0, 0, -1) x (-1, 0, 0)
  arc A0 (17.25, -11) -> (15.25, -9) centre (15.25, -11) ccw projected
  line L0 (12, -9) -> (15.25, -9) projected
  line L1 (-7.15, -9) -> (7.15, -9) projected
  line L2 (-15.25, -9) -> (-12, -9) projected
  arc A1 (-15.25, -9) -> (-17.25, -11) centre (-15.25, -11) ccw projected
  line L3 (-17.25, -41.5) -> (-17.25, -11) projected
  arc A2 (-17.25, -41.5) -> (-15.25, -43.5) centre (-15.25, -41.5) ccw projected
  line L4 (-8.45, -43.5) -> (-15.25, -43.5) projected
  line L5 (-8.45, -41.5) -> (-8.45, -43.5) projected
  line L6 (-15.25, -41.5) -> (-8.45, -41.5) projected
  line L7 (15.25, -11) -> (-15.25, -11) projected
  line L8 (15.25, -41.5) -> (15.25, -11) projected
  line L9 (8.45, -41.5) -> (15.25, -41.5) projected
  line L10 (8.45, -43.5) -> (8.45, -41.5) projected
  line L11 (15.25, -43.5) -> (8.45, -43.5) projected
  arc A3 (15.25, -43.5) -> (17.25, -41.5) centre (15.25, -41.5) ccw projected
  line L12 (17.25, -11) -> (17.25, -41.5) projected
  line L13 (7.15, -9) -> (7.15, 1) projected
  line L14 (-7.15, 1) -> (-7.15, -9) projected
  line L15 (-12, -9) -> (-12, 1) projected
  line L16 (-15.25, -11) -> (-15.25, -41.5) projected
  line L17 (-12, -9) -> (-7.15, -9)
  line L18 (12, -9) -> (7.15, -9)
  line L19 (12, 1) -> (12, -9) projected
  line L20 (7.15, 1) -> (12, 1) projected
  line L21 (-12, 1) -> (-7.15, 1) projected
sketch "Sketch23" plane through (0, 0, 5.81) normal (0, 0, 1) x (1, 0, 0)
  line L0 (-8.45, -43.5) -> (-8.45, -41.5) projected
  line L1 (-8.45, -41.5) -> (-15.25, -41.5) projected
  line L2 (-15.25, -41.5) -> (-15.25, -11) projected
  line L3 (-15.25, -11) -> (15.25, -11) projected
  line L4 (15.25, -11) -> (15.25, -41.5) projected
  line L5 (15.25, -41.5) -> (8.45, -41.5) projected
  line L6 (8.45, -41.5) -> (8.45, -43.5) projected
  line L7 (8.45, -43.5) -> (15.25, -43.5) projected
  arc A0 (15.25, -43.5) -> (17.25, -41.5) centre (15.25, -41.5) ccw projected
  line L8 (17.25, -41.5) -> (17.25, -11) projected
  arc A1 (17.25, -11) -> (15.25, -9) centre (15.25, -11) ccw projected
  line L9 (15.25, -9) -> (12, -9) projected
  line L10 (12, -9) -> (12, 1) projected
  line L11 (12, 1) -> (7.15, 1) projected
  line L12 (7.15, 1) -> (7.15, -9) projected
  line L13 (7.15, -9) -> (-7.15, -9) projected
  line L14 (-7.15, -9) -> (-7.15, 1) projected
  line L15 (-7.15, 1) -> (-12, 1) projected
  line L16 (-12, 1) -> (-12, -9) projected
  line L17 (-12, -9) -> (-15.25, -9) projected
  arc A2 (-15.25, -9) -> (-17.25, -11) centre (-15.25, -11) ccw projected
  line L18 (-17.25, -11) -> (-17.25, -41.5) projected
  arc A3 (-17.25, -41.5) -> (-15.25, -43.5) centre (-15.25, -41.5) ccw projected
  line L19 (-15.25, -43.5) -> (-8.45, -43.5) projected
  line L20 (-8.45, -43.5) -> (8.45, -43.5)
  line L21 (-12, -9) -> (-12, -4.81) projected
  line L22 (-12, -9) -> (12, -9)
  line L23 (15.25, -9) -> (9.2, -9) projected
  line L24 (-8.45, -41.5) -> (8.45, -41.5)
  point P0 (0, 0)
sketch "Sketch24" plane through (0, 0, 10.81) normal (0, 0, 1) x (1, 0, 0)
  line L0 (15.25, -41.5) -> (-15.25, -41.5) projected
  line L1 (-15.25, -41.5) -> (-15.25, -11) projected
  line L2 (-15.25, -11) -> (15.25, -11) projected
  line L3 (15.25, -11) -> (15.25, -41.5) projected
  line L4 (-15.25, -43.5) -> (15.25, -43.5) projected
  arc A0 (15.25, -43.5) -> (17.25, -41.5) centre (15.25, -41.5) ccw projected
  line L5 (17.25, -41.5) -> (17.25, -11) projected
  arc A1 (17.25, -11) -> (15.25, -9) centre (15.25, -11) ccw projected
  line L6 (15.25, -9) -> (-15.25, -9) projected
  arc A2 (-15.25, -9) -> (-17.25, -11) centre (-15.25, -11) ccw projected
  line L7 (-17.25, -11) -> (-17.25, -41.5) projected
  arc A3 (-17.25, -41.5) -> (-15.25, -43.5) centre (-15.25, -41.5) ccw projected
  point P0 (0, 0)
sketch "Sketch25" plane through (15.25, -11, 2) normal (0, 0, -1) x (-1, 0, 0)
  circle A0 centre (5.25, 7.19) radius 1
  line L0 (6.15, 8.19) -> (3.25, 8.19) projected
  circle A1 centre (25.25, 7.19) radius 1
  line L1 (27.25, 8.19) -> (24.35, 8.19) projected
  line L2 (24.35, 6.19) -> (27.25, 6.19) projected
  line L3 (25.25, 6.19) -> (27.25, 6.19)
  line L4 (27.25, 6.19) -> (27.25, 8.19)
  line L5 (5.25, 8.19) -> (3.25, 8.19)
  line L6 (3.25, 6.19) -> (5.25, 6.19)
  line L7 (3.25, 12) -> (3.25, 2) projected
  line L8 (3.25, 6.19) -> (3.25, 8.19)
  line L9 (25.25, 8.19) -> (27.25, 8.19)
  point P0 (15.25, 11)
  dimension "d168" = 2
  dimension "d169" = 2
  dimension "d170" = 2
  dimension "d171" = 2
properties part number "Intan_holder_v4_alt"
